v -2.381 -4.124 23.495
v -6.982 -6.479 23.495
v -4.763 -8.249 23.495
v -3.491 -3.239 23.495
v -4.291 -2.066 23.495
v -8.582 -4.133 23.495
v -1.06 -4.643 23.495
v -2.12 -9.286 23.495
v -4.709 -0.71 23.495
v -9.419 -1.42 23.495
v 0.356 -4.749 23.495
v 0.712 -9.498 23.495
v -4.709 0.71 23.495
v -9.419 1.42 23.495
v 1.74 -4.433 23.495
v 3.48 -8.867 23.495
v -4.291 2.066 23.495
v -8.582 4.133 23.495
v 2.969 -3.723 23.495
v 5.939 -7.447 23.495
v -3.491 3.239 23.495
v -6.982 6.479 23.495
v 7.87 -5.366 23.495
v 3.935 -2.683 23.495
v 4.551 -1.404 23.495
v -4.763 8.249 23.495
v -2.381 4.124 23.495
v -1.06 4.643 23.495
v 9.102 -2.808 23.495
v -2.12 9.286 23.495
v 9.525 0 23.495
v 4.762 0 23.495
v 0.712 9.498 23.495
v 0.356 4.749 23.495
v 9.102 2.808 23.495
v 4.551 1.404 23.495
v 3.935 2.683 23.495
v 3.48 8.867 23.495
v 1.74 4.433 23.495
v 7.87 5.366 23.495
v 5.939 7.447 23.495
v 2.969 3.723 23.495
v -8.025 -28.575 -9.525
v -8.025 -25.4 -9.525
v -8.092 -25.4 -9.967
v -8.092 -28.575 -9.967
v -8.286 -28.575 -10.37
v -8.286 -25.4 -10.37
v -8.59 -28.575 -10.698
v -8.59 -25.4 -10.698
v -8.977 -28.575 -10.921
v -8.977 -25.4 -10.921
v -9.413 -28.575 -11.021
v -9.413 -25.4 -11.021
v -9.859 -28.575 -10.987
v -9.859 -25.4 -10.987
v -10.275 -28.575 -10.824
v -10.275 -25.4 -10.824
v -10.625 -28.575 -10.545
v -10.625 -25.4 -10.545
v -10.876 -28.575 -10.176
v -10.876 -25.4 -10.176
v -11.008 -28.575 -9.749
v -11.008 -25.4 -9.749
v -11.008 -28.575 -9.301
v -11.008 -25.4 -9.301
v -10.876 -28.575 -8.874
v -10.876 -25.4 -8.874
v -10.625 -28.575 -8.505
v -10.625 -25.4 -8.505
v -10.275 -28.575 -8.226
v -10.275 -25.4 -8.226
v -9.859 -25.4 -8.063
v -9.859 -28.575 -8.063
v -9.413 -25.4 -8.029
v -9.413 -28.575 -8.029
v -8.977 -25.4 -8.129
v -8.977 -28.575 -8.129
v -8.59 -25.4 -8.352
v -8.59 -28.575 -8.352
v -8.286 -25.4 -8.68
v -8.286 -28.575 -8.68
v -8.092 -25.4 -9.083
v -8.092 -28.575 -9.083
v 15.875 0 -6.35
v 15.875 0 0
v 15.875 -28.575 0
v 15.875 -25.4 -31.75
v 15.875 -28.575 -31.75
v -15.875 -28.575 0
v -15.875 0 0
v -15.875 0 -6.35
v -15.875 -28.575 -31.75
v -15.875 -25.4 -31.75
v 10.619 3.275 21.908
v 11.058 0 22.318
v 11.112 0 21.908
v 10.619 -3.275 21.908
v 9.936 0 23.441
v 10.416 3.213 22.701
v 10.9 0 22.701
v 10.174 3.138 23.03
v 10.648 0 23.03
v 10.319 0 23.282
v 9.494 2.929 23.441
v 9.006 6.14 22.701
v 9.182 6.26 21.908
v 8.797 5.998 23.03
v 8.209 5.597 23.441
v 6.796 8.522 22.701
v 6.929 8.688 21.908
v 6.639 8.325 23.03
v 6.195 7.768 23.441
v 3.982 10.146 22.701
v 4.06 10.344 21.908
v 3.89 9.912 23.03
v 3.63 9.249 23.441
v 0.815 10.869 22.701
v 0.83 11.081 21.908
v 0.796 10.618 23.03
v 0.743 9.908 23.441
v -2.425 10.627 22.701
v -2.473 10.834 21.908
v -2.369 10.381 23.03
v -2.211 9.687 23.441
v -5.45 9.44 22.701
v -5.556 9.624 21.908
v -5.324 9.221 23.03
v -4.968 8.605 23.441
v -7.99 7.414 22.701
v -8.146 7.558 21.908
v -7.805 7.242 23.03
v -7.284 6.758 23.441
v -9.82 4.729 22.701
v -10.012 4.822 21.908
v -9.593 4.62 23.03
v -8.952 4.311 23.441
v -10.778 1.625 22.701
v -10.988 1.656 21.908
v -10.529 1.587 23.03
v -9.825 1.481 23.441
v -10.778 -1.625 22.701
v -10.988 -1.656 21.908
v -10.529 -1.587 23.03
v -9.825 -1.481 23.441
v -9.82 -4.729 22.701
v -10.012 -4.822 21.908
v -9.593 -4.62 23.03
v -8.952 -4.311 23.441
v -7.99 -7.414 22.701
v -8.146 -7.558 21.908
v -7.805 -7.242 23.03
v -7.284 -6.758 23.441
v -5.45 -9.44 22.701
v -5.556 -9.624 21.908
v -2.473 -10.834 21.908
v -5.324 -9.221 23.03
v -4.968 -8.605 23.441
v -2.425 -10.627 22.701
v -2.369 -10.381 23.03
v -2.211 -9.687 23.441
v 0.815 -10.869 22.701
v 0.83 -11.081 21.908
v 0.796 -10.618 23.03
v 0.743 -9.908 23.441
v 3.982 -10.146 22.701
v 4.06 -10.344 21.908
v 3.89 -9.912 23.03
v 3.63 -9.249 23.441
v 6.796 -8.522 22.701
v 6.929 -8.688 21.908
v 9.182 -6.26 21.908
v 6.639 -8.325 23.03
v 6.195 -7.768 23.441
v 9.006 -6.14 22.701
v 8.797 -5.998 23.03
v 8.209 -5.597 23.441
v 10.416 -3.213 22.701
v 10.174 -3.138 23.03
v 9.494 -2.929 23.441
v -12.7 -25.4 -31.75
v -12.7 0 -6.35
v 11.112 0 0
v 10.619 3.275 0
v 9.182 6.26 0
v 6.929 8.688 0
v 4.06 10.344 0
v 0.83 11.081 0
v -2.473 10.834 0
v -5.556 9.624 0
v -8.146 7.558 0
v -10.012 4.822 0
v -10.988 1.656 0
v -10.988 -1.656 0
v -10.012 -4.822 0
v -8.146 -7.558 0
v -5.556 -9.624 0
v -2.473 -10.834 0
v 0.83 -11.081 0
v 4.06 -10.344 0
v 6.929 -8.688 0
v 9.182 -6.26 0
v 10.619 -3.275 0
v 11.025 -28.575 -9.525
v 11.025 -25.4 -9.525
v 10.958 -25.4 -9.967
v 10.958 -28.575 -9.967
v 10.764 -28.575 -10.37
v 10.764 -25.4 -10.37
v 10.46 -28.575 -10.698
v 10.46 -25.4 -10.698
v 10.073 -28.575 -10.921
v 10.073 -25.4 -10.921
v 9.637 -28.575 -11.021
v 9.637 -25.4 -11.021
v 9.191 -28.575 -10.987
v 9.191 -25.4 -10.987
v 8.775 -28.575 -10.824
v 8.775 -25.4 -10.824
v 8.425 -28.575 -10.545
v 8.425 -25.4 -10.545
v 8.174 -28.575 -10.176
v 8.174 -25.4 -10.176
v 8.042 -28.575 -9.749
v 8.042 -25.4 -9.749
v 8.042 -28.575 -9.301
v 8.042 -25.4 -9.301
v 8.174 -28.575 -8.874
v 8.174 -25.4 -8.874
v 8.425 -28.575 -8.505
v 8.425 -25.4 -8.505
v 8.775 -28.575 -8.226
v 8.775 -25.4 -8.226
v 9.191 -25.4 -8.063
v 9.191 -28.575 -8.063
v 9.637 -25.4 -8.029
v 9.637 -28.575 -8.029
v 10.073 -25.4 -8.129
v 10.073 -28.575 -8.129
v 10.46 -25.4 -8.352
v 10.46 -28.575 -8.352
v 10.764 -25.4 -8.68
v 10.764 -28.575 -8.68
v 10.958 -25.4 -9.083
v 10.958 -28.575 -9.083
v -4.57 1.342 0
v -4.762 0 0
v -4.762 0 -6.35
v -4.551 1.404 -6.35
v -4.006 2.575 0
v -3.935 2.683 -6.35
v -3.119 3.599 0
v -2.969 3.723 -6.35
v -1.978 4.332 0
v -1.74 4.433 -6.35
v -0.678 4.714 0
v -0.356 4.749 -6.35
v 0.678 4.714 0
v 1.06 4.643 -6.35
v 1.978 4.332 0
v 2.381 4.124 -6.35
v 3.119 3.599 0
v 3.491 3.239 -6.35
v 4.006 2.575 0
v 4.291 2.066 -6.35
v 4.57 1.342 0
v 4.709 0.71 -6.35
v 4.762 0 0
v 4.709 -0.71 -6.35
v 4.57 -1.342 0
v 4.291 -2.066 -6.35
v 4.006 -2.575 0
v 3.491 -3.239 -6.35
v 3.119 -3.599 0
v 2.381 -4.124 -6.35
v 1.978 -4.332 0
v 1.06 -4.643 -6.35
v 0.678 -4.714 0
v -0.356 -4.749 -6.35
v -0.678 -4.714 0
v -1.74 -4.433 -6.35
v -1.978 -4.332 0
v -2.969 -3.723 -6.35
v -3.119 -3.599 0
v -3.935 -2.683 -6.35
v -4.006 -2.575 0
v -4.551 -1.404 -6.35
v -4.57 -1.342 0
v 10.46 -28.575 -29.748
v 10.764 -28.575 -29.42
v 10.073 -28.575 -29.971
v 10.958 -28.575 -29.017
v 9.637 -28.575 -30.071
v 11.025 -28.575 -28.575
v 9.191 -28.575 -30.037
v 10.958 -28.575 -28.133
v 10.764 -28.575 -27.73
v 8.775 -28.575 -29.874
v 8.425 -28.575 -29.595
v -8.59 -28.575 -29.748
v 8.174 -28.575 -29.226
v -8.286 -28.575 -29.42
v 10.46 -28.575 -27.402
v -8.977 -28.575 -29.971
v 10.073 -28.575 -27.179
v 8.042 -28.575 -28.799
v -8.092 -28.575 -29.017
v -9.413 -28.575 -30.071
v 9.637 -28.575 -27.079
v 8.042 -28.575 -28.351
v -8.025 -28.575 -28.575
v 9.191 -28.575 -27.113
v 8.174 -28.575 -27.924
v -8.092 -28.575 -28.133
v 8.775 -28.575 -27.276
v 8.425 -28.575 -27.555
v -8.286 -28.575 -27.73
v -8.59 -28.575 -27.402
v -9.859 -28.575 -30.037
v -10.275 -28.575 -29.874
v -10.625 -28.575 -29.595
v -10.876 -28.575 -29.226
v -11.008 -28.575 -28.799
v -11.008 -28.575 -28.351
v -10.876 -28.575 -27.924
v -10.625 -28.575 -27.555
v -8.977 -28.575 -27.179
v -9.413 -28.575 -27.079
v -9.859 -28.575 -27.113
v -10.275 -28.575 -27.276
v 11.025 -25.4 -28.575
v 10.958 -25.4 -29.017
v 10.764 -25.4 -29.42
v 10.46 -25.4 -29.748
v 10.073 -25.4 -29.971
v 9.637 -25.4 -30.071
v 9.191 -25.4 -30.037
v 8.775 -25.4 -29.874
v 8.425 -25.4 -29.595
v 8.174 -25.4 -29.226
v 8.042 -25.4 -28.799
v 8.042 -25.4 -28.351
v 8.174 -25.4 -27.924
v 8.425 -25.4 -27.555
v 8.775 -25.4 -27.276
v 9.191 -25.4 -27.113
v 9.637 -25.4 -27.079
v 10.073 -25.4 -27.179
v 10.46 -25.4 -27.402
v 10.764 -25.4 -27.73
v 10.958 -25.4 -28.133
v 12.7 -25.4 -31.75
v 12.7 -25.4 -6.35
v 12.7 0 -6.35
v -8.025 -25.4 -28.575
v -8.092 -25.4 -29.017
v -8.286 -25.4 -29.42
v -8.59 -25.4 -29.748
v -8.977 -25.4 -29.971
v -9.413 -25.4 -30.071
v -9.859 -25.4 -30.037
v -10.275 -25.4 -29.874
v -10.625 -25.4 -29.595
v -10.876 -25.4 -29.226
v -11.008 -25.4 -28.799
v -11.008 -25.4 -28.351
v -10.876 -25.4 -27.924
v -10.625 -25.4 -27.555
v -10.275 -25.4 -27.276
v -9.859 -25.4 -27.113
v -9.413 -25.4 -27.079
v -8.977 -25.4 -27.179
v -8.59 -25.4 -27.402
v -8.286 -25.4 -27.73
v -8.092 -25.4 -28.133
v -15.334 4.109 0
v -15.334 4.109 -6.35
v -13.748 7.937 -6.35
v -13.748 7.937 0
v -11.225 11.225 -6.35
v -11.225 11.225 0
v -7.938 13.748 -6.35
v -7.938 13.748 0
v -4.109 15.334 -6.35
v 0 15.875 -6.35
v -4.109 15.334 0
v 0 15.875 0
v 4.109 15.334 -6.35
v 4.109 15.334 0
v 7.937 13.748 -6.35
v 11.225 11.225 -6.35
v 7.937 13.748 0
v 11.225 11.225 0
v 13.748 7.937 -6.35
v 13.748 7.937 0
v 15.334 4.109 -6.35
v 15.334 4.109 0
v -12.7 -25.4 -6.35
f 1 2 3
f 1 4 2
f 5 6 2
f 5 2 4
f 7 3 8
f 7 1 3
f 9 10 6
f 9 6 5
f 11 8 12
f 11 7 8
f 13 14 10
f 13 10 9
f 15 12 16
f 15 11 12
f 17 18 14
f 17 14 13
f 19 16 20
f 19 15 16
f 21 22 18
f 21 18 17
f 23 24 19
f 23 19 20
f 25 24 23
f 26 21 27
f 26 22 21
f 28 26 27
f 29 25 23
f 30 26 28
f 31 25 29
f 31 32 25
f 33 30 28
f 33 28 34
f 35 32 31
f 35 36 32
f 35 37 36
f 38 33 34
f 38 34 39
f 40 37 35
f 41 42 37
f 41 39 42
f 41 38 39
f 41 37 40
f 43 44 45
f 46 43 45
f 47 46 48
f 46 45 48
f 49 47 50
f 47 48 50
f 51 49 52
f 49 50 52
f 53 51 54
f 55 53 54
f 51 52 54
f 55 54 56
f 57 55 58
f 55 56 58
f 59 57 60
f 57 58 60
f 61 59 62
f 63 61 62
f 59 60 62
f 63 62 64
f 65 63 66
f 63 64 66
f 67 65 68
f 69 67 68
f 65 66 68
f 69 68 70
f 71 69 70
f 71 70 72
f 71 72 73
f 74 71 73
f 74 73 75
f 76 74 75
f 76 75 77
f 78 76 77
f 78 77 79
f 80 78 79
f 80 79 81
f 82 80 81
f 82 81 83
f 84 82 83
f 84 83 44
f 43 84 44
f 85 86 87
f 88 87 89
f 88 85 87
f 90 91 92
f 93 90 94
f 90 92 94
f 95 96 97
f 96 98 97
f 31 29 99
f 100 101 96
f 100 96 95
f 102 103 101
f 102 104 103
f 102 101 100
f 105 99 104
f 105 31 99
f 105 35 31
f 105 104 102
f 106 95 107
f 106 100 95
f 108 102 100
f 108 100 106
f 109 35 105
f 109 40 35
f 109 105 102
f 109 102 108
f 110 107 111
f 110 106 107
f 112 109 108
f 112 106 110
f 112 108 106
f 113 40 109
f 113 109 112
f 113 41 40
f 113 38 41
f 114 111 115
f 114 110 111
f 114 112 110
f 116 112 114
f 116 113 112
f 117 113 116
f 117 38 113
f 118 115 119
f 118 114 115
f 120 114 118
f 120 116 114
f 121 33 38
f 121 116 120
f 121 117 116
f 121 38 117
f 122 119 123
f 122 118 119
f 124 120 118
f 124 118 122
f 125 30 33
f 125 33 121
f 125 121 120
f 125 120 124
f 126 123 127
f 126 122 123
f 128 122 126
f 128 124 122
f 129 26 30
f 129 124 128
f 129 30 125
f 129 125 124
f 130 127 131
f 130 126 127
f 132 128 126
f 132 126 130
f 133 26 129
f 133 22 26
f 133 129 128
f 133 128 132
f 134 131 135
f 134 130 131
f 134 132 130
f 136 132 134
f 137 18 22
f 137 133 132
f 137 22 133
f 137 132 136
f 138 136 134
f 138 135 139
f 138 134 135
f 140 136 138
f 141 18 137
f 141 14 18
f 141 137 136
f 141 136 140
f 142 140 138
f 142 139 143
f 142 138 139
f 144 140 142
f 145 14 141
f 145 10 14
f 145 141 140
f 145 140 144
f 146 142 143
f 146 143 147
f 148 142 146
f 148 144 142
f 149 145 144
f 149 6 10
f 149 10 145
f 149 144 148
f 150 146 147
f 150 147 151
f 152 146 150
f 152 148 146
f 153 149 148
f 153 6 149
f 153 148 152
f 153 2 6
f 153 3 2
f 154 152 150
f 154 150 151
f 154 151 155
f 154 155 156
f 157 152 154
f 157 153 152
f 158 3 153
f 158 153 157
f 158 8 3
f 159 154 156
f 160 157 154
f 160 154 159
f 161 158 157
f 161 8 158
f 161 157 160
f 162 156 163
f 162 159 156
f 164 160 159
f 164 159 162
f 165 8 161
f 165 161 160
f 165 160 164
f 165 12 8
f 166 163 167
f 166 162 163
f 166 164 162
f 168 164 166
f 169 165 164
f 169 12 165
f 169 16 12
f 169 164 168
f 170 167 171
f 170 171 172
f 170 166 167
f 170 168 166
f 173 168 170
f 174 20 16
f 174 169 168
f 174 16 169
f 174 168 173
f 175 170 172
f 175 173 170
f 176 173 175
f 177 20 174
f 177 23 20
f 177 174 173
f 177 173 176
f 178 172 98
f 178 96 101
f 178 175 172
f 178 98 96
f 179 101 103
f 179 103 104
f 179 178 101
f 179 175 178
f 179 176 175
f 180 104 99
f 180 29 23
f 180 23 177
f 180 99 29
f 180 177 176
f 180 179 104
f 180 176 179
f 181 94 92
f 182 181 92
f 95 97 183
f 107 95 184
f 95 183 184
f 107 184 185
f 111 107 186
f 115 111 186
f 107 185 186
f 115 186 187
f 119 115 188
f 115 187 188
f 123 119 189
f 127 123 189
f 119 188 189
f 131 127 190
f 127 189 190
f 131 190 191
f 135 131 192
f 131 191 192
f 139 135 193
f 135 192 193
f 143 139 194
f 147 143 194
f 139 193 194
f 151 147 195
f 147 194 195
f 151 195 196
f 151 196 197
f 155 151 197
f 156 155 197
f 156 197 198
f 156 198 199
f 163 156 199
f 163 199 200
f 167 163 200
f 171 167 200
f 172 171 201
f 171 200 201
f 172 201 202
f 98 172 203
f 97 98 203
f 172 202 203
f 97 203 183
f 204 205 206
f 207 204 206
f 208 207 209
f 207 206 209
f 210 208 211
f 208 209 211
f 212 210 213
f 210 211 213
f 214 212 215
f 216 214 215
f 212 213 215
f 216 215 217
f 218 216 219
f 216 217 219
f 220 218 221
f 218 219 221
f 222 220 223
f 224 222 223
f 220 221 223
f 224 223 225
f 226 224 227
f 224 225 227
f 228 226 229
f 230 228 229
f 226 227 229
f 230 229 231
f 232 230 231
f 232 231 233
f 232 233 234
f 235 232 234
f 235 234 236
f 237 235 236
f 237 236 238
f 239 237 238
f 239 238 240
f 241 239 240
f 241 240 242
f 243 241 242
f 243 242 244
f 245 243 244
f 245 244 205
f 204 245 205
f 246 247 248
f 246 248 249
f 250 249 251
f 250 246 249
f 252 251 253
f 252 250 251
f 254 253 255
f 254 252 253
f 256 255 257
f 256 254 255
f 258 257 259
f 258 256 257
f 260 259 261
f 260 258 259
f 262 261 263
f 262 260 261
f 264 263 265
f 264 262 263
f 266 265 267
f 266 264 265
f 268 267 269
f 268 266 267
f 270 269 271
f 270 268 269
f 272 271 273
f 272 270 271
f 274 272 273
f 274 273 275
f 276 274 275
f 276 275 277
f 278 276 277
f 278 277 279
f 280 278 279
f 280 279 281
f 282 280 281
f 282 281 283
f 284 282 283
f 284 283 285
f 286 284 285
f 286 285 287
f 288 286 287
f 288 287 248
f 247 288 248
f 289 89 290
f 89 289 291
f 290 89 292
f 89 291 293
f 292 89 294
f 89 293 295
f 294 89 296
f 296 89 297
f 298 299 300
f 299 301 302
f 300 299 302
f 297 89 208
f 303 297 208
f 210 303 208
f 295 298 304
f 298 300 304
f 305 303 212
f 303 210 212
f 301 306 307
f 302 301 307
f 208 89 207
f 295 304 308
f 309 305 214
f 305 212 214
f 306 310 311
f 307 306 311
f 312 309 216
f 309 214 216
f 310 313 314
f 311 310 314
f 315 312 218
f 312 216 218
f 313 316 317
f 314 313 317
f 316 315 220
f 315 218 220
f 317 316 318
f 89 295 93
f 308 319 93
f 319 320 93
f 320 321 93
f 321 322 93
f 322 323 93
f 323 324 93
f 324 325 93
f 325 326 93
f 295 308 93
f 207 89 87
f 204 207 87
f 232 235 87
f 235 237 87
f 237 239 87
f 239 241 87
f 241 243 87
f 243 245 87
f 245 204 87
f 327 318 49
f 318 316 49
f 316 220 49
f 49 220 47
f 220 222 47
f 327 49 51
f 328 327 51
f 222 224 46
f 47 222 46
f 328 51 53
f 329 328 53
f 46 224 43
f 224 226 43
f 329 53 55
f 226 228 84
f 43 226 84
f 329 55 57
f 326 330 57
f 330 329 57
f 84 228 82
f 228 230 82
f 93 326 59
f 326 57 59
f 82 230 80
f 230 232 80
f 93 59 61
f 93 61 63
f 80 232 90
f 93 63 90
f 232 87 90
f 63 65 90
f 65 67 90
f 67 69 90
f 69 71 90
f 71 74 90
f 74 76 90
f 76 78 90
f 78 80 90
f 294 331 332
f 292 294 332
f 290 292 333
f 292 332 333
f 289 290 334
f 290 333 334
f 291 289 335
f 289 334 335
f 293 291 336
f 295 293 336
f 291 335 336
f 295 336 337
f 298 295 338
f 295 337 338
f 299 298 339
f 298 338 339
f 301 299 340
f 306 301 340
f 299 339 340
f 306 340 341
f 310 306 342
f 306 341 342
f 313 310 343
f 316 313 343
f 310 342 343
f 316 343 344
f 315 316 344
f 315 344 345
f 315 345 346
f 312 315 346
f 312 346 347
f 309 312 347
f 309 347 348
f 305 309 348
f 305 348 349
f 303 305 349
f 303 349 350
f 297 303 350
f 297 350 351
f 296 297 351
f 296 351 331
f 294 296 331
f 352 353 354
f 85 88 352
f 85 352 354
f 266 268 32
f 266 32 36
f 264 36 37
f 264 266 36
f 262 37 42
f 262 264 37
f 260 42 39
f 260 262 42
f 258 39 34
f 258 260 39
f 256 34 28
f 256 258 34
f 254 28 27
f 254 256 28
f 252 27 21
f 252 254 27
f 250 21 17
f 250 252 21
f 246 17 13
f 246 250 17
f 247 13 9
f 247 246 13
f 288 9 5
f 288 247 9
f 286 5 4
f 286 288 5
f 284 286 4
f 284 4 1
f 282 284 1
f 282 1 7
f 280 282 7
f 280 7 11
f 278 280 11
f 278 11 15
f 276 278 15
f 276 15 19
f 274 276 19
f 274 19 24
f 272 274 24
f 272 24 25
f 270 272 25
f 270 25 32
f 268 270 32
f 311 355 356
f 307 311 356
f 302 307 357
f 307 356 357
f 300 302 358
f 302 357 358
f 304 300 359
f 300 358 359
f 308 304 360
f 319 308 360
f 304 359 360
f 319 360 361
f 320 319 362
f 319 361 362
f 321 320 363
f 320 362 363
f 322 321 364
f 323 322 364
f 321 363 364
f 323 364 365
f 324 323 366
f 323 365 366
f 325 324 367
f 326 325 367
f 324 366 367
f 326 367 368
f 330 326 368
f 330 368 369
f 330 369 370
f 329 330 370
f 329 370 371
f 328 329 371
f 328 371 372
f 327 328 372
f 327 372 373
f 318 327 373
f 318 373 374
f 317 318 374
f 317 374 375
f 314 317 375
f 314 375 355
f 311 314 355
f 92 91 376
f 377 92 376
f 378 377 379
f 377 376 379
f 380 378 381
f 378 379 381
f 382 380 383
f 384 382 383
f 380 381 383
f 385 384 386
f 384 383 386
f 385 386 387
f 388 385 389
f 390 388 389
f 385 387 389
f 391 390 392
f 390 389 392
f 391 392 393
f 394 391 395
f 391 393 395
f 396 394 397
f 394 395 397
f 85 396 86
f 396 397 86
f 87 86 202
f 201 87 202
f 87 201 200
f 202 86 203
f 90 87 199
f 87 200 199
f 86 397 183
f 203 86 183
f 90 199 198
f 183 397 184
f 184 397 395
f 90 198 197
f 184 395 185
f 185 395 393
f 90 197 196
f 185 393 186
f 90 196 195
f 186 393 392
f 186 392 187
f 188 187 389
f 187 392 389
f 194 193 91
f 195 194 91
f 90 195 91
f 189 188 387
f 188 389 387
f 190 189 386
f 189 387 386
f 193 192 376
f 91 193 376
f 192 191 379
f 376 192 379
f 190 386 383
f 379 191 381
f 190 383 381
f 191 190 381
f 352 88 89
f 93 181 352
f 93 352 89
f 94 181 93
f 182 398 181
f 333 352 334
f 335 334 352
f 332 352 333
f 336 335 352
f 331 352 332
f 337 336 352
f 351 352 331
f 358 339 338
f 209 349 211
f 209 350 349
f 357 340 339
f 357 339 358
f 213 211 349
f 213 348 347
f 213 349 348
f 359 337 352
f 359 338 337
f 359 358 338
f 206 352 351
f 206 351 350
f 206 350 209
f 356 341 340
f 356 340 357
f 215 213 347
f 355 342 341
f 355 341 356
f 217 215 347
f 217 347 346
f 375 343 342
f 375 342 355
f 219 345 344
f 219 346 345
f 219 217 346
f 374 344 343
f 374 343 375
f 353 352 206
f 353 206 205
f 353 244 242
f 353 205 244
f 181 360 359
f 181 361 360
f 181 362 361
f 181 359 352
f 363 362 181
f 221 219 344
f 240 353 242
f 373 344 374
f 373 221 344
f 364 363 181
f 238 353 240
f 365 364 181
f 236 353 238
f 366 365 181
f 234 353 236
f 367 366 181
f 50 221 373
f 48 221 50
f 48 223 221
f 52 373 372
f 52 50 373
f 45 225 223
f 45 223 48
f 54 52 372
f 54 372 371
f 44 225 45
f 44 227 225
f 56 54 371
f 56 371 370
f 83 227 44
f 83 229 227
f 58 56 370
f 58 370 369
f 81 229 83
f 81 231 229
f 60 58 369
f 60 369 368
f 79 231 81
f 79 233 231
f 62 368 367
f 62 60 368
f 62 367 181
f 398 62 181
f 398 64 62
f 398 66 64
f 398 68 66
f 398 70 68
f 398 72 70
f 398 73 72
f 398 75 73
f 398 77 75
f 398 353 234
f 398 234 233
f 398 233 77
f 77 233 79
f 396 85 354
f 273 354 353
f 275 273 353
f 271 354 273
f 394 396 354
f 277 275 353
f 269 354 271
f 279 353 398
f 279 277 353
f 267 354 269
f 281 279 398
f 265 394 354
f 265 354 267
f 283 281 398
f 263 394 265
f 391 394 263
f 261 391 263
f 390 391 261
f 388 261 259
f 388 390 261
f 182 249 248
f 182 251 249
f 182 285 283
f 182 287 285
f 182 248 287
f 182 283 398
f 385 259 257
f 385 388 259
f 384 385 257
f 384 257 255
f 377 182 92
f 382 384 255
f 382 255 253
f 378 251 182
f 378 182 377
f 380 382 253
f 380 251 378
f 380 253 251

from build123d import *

# Parameters (mm, degrees)
SKETCH1_R           = 11.1125
SKETCH1_R_2         = 4.7625
BOSS_EXTRUDE1_DEPTH = 23.495
SKETCH2_R           = 4.7625
BOSS_EXTRUDE2_DEPTH = 6.35
SKETCH3_W           = 31.75
SKETCH3_H           = 3.175
BOSS_EXTRUDE3_DEPTH = 25.4
BOSS_EXTRUDE4_DEPTH = 3.175
BOSS_EXTRUDE5_DEPTH = 3.175
SKETCH6_R           = 1.5
CUT_EXTRUDE1_DEPTH  = 12.319
FILLET1_R           = 1.5875


with BuildPart() as part:
    # Sketch1 → Boss-Extrude1 (new body)
    with BuildSketch(Plane.XY):
        Circle(SKETCH1_R)
        Circle(SKETCH1_R_2, mode=Mode.SUBTRACT)
    extrude(amount=BOSS_EXTRUDE1_DEPTH)

    # Sketch2 → Boss-Extrude2 (add)
    with BuildSketch(Plane(origin=(0, 0, 0), x_dir=(-1, 0, 0), z_dir=(0, 0, -1))):
        with BuildLine():
            Line((15.875, -28.575), (15.875, 0))
            ThreePointArc((15.875, 0), (0, 15.875), (-15.875, 0))
            Line((-15.875, 0), (-15.875, -28.575))
            Line((-15.875, -28.575), (15.875, -28.575))
        make_face()
        Circle(SKETCH2_R, mode=Mode.SUBTRACT)
    extrude(amount=BOSS_EXTRUDE2_DEPTH)

    # Sketch3 → Boss-Extrude3 (add)
    with BuildSketch(Plane(origin=(0, 0, -6.35), x_dir=(-1, 0, 0), z_dir=(0, 0, -1))):
        with Locations((0, -26.9875)):
            Rectangle(SKETCH3_W, SKETCH3_H)
    extrude(amount=BOSS_EXTRUDE3_DEPTH)

    # Sketch4 → Boss-Extrude4 (add)
    with BuildSketch(Plane.ZY.offset(15.875)):
        Polygon((-31.75, -25.4), (-6.35, 0), (-6.35, -25.4), align=None)
    extrude(amount=-BOSS_EXTRUDE4_DEPTH)

    # Sketch5 → Boss-Extrude5 (add)
    with BuildSketch(Plane(origin=(15.875, 0, 0), x_dir=(0, 0, -1), z_dir=(1, 0, 0))):
        Polygon((6.35, -25.4), (31.75, -25.4), (6.35, 0), align=None)
    extrude(amount=-BOSS_EXTRUDE5_DEPTH)

    # Sketch6 → Cut-Extrude1 (cut)
    with BuildSketch(Plane(origin=(0, -25.4, 0), x_dir=(1, 0, 0), z_dir=(0, 1, 0))):
        with Locations((-9.525, 28.575)):
            Circle(SKETCH6_R)
        with Locations((9.525, 28.575)):
            Circle(SKETCH6_R)
        with Locations((9.525, 9.525)):
            Circle(SKETCH6_R)
        with Locations((-9.525, 9.525)):
            Circle(SKETCH6_R)
    extrude(amount=-CUT_EXTRUDE1_DEPTH, mode=Mode.SUBTRACT)

    # Fillet1
    fillet1_edges = [part.edges().sort_by_distance(p)[0] for p in [
        (-11.1125, 0, 23.495),
    ]]
    fillet(fillet1_edges, radius=FILLET1_R)


solid = part.part
